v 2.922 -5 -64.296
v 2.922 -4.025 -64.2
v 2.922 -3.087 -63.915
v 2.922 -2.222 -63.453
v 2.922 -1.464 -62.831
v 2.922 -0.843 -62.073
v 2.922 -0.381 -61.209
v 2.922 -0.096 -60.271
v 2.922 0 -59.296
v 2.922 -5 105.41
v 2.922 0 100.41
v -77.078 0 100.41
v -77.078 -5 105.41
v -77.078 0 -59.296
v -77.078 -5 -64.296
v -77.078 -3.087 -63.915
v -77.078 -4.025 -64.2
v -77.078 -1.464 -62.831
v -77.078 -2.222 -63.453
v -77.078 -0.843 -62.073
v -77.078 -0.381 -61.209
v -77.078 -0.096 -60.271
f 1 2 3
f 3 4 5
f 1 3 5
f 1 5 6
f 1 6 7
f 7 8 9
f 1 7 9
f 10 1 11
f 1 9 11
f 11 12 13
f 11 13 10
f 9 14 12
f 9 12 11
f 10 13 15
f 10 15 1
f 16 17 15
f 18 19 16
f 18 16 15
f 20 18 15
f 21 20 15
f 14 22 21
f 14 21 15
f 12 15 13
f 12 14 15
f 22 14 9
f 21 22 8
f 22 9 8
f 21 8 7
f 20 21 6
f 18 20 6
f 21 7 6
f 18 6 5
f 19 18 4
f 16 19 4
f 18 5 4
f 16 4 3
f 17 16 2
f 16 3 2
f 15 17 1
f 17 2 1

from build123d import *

# Parameters (mm, degrees)
F0_W     = 80
F0_H     = 169.70563
F1_DEPTH = 5
F2_SIZE  = 4.99999
F3_R     = 4.99999


# Not quite as in the source:
# - a fillet or chamfer is up to 0.001 mm smaller than in the source, because OpenCascade refuses the exact size


with BuildPart() as f1:
    # F0 (on Front) → F1 (new body)
    with BuildSketch(Plane.XZ):
        with Locations((-37.0779657288, 20.5572328247)):
            Rectangle(F0_W, F0_H)
    extrude(amount=F1_DEPTH)

    # F2 (size 5 in the source; OpenCascade refuses exactly that, so slightly less here)
    f2_edges = [f1.edges().sort_by_distance(p)[0] for p in [
        (-37.077966, 0, 105.410048),
    ]]
    chamfer(f2_edges, length=F2_SIZE)

    # F3 (radius 5 in the source; OpenCascade refuses exactly that, so slightly less here)
    f3_edges = [f1.edges().sort_by_distance(p)[0] for p in [
        (-37.077966, 0, -64.295582),
    ]]
    fillet(f3_edges, radius=F3_R)


solid = f1.part
